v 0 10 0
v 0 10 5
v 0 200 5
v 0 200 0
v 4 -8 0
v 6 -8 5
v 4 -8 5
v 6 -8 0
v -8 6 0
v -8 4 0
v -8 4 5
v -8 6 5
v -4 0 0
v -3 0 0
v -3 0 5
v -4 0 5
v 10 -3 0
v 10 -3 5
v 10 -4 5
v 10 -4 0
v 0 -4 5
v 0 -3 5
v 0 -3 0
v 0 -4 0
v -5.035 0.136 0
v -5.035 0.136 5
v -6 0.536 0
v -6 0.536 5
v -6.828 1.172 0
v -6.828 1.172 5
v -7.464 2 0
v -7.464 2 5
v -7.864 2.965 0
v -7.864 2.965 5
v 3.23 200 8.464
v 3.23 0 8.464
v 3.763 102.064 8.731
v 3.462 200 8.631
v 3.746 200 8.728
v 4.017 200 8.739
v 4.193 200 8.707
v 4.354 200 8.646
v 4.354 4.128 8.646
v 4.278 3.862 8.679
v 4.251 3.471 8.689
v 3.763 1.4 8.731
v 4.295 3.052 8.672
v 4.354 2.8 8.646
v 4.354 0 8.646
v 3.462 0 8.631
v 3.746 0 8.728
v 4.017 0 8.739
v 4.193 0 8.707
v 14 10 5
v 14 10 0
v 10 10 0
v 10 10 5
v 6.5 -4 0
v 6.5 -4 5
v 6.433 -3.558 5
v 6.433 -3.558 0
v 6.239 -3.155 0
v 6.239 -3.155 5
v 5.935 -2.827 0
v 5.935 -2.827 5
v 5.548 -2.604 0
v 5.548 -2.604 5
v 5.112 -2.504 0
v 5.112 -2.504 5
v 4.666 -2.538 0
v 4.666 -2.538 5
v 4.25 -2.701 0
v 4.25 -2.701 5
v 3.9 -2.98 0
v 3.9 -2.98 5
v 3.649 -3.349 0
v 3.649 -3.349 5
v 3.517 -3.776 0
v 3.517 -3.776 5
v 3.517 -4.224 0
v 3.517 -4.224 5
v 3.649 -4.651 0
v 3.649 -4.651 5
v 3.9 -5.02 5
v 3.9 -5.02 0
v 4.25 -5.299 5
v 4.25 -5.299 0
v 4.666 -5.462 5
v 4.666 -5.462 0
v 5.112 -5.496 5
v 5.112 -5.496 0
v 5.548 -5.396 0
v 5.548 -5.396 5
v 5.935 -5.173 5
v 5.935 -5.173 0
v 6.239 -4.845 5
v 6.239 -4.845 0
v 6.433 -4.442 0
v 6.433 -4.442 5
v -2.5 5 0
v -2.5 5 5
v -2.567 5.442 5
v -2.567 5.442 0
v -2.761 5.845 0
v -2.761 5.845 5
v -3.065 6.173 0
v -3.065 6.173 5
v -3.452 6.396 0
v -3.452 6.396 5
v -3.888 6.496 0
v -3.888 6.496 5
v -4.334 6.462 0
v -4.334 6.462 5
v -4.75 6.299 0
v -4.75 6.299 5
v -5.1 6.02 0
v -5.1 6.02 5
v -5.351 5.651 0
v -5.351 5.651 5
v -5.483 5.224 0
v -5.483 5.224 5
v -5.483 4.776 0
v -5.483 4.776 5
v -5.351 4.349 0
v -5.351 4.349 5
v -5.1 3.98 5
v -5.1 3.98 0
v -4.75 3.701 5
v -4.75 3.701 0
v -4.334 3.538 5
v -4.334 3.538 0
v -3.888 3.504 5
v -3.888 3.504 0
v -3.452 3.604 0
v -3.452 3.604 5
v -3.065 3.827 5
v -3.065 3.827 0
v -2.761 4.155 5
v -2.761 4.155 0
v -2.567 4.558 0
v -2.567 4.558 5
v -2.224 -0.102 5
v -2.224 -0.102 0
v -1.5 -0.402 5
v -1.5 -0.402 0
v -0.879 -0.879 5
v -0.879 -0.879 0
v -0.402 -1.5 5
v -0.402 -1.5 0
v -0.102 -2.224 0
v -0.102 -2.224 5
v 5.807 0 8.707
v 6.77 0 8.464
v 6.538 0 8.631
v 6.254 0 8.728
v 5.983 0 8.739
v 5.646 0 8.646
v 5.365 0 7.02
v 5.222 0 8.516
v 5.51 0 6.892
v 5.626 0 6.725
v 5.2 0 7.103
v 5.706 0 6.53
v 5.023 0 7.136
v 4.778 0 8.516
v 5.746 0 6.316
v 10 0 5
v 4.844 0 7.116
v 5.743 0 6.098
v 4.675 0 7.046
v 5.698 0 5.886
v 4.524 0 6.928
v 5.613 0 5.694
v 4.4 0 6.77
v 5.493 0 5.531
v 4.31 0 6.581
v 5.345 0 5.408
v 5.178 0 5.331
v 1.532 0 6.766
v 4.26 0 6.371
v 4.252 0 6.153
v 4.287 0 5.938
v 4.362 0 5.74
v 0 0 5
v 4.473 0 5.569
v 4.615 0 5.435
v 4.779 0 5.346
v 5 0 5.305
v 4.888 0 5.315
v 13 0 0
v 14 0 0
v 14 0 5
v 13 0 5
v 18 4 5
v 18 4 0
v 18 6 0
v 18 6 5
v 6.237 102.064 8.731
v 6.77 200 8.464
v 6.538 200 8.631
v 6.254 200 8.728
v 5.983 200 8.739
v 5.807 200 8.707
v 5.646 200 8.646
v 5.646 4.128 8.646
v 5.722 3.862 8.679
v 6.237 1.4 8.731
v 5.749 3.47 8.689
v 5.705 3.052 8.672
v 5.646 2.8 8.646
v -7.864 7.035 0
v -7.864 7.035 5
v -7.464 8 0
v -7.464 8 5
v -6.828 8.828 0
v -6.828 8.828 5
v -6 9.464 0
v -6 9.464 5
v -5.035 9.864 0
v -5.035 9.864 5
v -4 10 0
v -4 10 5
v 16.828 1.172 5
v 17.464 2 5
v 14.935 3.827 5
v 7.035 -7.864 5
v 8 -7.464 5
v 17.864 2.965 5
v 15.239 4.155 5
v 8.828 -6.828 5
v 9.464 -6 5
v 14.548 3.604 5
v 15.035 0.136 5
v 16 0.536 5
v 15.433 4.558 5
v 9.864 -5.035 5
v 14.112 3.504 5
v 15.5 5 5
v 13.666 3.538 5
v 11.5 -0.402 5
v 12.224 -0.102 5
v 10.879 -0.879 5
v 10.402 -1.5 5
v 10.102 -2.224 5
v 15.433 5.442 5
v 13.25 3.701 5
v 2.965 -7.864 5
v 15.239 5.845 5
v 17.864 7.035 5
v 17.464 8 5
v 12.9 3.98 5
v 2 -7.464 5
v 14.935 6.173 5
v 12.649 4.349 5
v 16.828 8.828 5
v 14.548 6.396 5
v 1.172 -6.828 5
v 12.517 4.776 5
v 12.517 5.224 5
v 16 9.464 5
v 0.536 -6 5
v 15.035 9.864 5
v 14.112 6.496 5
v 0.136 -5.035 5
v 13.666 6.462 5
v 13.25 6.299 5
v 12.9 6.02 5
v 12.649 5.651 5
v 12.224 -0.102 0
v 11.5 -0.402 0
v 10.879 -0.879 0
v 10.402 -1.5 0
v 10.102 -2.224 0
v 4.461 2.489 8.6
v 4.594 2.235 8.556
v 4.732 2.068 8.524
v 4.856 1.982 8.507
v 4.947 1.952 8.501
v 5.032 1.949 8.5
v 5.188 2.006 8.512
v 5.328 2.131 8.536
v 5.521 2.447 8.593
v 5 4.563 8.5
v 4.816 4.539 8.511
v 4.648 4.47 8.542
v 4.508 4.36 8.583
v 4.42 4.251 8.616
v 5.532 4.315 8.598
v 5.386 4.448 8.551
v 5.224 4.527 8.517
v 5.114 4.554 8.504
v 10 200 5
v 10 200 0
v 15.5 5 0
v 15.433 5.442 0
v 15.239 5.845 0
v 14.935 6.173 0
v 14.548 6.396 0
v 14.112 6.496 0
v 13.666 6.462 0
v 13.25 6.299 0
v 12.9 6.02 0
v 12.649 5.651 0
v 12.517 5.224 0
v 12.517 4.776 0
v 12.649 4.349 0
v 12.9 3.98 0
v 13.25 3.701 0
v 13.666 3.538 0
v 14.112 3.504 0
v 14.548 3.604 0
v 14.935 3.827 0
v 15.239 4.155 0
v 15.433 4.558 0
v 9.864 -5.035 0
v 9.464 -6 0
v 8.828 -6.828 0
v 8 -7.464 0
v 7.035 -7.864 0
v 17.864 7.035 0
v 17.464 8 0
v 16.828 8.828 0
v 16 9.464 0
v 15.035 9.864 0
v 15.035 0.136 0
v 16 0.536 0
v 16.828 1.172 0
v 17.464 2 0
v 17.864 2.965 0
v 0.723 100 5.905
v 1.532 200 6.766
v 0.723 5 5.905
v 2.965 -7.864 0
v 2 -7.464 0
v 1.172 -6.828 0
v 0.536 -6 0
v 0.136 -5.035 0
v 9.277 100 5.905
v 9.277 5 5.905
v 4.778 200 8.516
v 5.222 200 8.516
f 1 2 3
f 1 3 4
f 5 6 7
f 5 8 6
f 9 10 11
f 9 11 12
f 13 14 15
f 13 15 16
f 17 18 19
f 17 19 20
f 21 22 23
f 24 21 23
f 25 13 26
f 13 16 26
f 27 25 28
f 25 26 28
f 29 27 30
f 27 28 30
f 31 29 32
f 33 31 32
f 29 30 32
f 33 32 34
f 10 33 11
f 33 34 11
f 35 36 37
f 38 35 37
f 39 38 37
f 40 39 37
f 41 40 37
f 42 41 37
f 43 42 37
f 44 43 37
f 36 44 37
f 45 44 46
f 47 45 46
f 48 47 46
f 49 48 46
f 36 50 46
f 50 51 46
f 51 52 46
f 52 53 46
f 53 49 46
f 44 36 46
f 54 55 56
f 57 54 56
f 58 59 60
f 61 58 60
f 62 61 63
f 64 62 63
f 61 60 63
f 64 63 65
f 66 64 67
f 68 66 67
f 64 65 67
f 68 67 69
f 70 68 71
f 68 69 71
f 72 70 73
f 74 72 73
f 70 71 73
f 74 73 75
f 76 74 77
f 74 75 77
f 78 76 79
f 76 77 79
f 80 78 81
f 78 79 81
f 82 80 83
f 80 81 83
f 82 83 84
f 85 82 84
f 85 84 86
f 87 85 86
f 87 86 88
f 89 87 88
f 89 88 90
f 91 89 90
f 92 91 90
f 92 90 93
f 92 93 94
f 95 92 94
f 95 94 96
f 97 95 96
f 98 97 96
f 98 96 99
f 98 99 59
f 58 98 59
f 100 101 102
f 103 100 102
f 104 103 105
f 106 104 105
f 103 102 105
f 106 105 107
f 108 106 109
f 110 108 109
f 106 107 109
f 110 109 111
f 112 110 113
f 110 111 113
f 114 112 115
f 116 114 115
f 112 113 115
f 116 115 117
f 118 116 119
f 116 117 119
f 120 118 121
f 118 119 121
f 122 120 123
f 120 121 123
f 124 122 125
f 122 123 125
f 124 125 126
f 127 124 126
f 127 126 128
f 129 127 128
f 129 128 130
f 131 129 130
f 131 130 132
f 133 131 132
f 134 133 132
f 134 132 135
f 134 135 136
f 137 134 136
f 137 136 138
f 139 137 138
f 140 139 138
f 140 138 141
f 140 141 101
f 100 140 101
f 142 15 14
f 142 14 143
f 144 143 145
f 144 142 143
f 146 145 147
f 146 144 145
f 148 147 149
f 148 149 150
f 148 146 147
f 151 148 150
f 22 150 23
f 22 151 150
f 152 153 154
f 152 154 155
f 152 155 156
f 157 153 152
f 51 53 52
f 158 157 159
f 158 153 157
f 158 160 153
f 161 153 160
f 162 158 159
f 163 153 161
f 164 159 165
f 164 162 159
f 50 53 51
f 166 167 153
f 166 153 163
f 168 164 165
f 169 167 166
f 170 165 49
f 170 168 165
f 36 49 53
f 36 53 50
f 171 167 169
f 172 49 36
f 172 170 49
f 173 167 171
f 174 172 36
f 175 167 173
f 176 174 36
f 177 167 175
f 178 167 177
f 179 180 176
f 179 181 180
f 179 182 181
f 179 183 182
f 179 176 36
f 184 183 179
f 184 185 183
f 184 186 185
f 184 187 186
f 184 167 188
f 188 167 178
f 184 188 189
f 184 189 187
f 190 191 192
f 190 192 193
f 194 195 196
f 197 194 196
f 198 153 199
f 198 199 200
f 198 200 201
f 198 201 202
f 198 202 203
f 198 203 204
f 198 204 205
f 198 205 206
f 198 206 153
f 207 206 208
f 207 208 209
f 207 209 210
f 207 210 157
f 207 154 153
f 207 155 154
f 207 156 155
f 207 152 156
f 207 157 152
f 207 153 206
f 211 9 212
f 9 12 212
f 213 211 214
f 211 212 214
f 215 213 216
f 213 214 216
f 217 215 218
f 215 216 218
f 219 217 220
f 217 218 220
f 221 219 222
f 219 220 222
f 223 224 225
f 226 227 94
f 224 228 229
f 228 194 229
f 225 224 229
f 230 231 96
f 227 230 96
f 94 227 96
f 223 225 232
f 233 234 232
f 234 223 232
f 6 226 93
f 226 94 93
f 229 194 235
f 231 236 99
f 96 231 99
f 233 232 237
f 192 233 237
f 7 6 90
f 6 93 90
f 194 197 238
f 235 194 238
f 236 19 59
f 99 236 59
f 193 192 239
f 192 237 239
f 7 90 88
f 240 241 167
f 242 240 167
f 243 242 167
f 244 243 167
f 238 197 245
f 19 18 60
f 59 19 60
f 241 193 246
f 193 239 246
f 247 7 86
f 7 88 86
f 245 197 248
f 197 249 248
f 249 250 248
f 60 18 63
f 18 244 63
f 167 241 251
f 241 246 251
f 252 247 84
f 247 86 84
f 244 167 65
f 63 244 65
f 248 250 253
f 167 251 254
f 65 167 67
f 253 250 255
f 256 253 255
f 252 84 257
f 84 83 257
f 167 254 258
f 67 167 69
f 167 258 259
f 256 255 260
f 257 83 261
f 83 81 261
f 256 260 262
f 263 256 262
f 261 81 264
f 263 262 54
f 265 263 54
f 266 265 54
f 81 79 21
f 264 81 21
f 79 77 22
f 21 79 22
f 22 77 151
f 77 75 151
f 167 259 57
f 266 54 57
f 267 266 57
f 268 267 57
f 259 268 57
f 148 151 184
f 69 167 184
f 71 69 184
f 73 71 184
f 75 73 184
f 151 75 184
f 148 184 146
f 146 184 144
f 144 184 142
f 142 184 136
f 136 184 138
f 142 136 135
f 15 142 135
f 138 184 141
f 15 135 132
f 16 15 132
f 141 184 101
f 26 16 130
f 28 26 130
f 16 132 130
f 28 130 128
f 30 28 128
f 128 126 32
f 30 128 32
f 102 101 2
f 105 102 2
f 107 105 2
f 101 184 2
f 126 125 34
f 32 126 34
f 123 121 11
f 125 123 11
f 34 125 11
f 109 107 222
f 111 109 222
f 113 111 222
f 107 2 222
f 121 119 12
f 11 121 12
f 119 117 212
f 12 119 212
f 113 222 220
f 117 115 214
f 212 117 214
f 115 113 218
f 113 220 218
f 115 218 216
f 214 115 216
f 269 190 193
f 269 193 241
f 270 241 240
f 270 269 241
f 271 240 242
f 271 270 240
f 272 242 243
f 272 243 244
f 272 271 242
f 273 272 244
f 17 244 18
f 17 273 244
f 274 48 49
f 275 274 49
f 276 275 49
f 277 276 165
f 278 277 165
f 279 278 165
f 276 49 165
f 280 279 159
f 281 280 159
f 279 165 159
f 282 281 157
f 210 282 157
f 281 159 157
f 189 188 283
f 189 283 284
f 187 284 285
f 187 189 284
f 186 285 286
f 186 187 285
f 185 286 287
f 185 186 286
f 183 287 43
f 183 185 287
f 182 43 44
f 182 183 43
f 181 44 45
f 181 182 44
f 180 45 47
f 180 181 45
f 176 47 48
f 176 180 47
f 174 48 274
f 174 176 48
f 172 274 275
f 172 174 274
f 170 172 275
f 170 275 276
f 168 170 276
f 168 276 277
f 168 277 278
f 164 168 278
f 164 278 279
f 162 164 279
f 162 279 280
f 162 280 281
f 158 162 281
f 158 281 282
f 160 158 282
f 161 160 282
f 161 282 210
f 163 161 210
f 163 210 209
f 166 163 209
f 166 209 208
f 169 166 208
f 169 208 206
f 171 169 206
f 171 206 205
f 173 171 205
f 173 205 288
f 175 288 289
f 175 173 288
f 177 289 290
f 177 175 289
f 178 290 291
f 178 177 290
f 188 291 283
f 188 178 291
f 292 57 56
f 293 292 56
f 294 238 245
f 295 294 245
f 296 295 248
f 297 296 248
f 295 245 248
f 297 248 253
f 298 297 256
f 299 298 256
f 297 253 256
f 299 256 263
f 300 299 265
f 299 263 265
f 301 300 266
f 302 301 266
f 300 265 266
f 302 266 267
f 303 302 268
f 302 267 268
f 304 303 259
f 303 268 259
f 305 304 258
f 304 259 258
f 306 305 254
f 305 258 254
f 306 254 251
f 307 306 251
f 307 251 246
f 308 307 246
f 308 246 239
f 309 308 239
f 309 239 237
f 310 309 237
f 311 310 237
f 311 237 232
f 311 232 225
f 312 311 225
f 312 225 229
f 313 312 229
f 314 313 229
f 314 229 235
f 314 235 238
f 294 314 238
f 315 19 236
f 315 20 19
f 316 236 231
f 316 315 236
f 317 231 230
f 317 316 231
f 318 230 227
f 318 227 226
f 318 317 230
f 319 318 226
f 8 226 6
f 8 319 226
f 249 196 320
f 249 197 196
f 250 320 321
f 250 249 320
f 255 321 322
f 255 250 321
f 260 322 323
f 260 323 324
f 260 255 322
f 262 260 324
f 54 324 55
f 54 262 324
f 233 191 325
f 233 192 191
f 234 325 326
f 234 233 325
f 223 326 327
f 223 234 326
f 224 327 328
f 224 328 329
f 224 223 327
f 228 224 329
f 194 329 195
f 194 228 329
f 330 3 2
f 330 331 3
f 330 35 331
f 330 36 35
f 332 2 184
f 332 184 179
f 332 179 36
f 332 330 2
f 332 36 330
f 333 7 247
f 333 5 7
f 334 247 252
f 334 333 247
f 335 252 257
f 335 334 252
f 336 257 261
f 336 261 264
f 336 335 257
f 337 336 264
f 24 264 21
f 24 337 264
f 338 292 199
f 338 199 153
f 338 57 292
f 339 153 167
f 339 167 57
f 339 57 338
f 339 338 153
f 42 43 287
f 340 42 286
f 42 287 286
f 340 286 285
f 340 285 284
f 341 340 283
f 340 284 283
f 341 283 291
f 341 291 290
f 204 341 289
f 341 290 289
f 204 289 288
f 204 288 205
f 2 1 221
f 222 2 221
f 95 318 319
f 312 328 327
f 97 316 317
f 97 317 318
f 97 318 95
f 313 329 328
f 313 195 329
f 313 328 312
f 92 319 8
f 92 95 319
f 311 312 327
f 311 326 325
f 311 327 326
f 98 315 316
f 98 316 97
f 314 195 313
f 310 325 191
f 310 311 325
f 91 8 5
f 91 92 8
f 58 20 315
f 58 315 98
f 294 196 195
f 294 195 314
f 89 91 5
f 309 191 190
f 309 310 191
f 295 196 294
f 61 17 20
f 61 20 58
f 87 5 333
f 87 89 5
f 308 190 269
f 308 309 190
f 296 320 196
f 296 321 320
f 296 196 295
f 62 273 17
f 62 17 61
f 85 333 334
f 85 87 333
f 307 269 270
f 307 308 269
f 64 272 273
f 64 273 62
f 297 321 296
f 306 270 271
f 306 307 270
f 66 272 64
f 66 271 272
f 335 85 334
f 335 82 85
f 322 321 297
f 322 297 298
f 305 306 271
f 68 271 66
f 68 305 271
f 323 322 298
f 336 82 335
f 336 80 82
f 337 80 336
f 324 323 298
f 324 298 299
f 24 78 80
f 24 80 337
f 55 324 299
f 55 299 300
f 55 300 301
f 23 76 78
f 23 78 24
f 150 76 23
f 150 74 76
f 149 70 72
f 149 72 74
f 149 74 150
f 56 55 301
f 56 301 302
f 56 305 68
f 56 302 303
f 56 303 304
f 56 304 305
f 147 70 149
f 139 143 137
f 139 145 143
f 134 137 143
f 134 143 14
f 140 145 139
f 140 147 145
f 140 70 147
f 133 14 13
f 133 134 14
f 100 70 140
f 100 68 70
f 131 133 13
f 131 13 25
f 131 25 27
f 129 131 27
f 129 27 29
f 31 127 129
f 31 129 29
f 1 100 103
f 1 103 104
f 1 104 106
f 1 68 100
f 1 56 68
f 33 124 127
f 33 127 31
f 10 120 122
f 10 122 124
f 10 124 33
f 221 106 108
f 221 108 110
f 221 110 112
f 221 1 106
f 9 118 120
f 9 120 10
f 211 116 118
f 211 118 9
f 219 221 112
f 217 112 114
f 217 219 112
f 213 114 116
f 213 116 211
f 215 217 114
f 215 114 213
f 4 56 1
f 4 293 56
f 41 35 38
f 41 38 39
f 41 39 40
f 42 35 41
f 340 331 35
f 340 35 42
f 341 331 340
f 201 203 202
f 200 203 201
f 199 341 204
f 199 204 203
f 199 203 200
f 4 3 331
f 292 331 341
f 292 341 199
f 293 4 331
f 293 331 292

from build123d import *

# Parameters (mm, degrees)
SKETCH1_W           = 10
SKETCH1_H           = 10
BOSS_EXTRUDE1_DEPTH = 200
FILLET1_SIZE        = 5
SKETCH2_R           = 1.5
CUT_EXTRUDE1_DEPTH  = 201.499376667
FILLET2_R           = 1
SKETCH4_W           = 8
SKETCH4_H           = 10
BOSS_EXTRUDE2_DEPTH = 5
SKETCH5_W           = 10
SKETCH5_H           = 5
BOSS_EXTRUDE3_DEPTH = 8
FILLET3_R           = 4
FILLET4_R           = 3
SKETCH6_R           = 1.5
CUT_EXTRUDE3_DEPTH  = 201.870605219
SKETCH7_R           = 0.75
CUT_EXTRUDE4_DEPTH  = 8


with BuildPart() as part:
    # Sketch1 → Boss-Extrude1 (new body)
    with BuildSketch(Plane(origin=(0, 0, 0), x_dir=(1, 0, 0), z_dir=(0, 1, 0))):
        with Locations((5, -5)):
            Rectangle(SKETCH1_W, SKETCH1_H)
    extrude(amount=BOSS_EXTRUDE1_DEPTH)

    # Fillet1
    # a fillet whose section is not a circle: 5 mm, written as the material it takes off along each edge
    with BuildSketch(Plane(origin=(0, -12.5, 10), x_dir=(1, 0, 0), z_dir=(0, 1, 0)), Plane(origin=(10, -12.5, 10), x_dir=(0, 0, -1), z_dir=(0, 1, 0))) as fillet1_piece_1:
        with BuildLine():
            Bezier((FILLET1_SIZE, 0), (0, 0), (0, FILLET1_SIZE), weights=[1, 0.052631579, 1])
            Line((0, FILLET1_SIZE), (0, 0))
            Line((0, 0), (FILLET1_SIZE, 0))
        make_face()
    extrude(amount=225, mode=Mode.SUBTRACT)

    # Sketch2 → Cut-Extrude1 (cut, through all)
    with BuildSketch(Plane(origin=(0, 0, 0), x_dir=(-1, 0, 0), z_dir=(0, -1, 0))):
        with Locations((-5, -10)):
            Circle(SKETCH2_R)
    extrude(amount=-CUT_EXTRUDE1_DEPTH, mode=Mode.SUBTRACT)

    # Fillet2
    fillet2_edges = [part.edges().sort_by_distance(p)[0] for p in [
        (3.843309936, 100, 9.044977437),
        (6.156690064, 100, 9.044977437),
    ]]
    fillet(fillet2_edges, radius=FILLET2_R)

    # Sketch4 → Boss-Extrude2 (add)
    with BuildSketch(Plane(origin=(0, 0, 0), x_dir=(-1, 0, 0), z_dir=(0, 0, -1))):
        with Locations((4, 5)):
            Rectangle(SKETCH4_W, SKETCH4_H)
        with Locations((-14, 5)):
            Rectangle(SKETCH4_W, SKETCH4_H)
    extrude(amount=-BOSS_EXTRUDE2_DEPTH)

    # Sketch5 → Boss-Extrude3 (add)
    with BuildSketch(Plane(origin=(0, 0, 0), x_dir=(-1, 0, 0), z_dir=(0, -1, 0))):
        with Locations((-5, -2.5)):
            Rectangle(SKETCH5_W, SKETCH5_H)
    extrude(amount=BOSS_EXTRUDE3_DEPTH)

    # Fillet3
    fillet3_edges = [part.edges().sort_by_distance(p)[0] for p in [
        (18, 10, 2.5),
        (18, 0, 2.5),
        (10, -8, 2.5),
        (0, -8, 2.5),
        (-8, 10, 2.5),
        (-8, 0, 2.5),
    ]]
    fillet(fillet3_edges, radius=FILLET3_R)

    # Fillet4
    # the kernel refuses this fillet: 3 mm, written as the material it adds along each edge
    with BuildSketch(Plane(origin=(10, 0, 0), x_dir=(1, 0, 0), z_dir=(0, 0, 1)), Plane(origin=(0, 0, 5), x_dir=(-1, 0, 0), z_dir=(0, 0, -1))) as fillet4_piece_1:
        with BuildLine():
            CenterArc((FILLET4_R, -FILLET4_R), FILLET4_R, 90, 90)
            Line((0, -FILLET4_R), (0, 0))
            Line((0, 0), (FILLET4_R, 0))
        make_face()
    extrude(amount=5)

    # Sketch6 → Cut-Extrude3 (cut, through all)
    with BuildSketch(Plane.XY.offset(5)):
        with Locations((-4, 5)):
            Circle(SKETCH6_R)
        with Locations((14, 5)):
            Circle(SKETCH6_R)
        with Locations((5, -4)):
            Circle(SKETCH6_R)
    extrude(amount=-CUT_EXTRUDE3_DEPTH, mode=Mode.SUBTRACT)

    # Sketch7 → Cut-Extrude4 (cut)
    with BuildSketch(Plane(origin=(0, 2.349231552, 1.644949642), x_dir=(-1, 0, 0), z_dir=(0, 0.8191520442889949, 0.5735764363510416))):
        with Locations(Location((-5, 5.095760221, 0), (0, 0, 270))):
            Circle(SKETCH7_R)
    extrude(amount=CUT_EXTRUDE4_DEPTH, mode=Mode.SUBTRACT)


solid = part.part
